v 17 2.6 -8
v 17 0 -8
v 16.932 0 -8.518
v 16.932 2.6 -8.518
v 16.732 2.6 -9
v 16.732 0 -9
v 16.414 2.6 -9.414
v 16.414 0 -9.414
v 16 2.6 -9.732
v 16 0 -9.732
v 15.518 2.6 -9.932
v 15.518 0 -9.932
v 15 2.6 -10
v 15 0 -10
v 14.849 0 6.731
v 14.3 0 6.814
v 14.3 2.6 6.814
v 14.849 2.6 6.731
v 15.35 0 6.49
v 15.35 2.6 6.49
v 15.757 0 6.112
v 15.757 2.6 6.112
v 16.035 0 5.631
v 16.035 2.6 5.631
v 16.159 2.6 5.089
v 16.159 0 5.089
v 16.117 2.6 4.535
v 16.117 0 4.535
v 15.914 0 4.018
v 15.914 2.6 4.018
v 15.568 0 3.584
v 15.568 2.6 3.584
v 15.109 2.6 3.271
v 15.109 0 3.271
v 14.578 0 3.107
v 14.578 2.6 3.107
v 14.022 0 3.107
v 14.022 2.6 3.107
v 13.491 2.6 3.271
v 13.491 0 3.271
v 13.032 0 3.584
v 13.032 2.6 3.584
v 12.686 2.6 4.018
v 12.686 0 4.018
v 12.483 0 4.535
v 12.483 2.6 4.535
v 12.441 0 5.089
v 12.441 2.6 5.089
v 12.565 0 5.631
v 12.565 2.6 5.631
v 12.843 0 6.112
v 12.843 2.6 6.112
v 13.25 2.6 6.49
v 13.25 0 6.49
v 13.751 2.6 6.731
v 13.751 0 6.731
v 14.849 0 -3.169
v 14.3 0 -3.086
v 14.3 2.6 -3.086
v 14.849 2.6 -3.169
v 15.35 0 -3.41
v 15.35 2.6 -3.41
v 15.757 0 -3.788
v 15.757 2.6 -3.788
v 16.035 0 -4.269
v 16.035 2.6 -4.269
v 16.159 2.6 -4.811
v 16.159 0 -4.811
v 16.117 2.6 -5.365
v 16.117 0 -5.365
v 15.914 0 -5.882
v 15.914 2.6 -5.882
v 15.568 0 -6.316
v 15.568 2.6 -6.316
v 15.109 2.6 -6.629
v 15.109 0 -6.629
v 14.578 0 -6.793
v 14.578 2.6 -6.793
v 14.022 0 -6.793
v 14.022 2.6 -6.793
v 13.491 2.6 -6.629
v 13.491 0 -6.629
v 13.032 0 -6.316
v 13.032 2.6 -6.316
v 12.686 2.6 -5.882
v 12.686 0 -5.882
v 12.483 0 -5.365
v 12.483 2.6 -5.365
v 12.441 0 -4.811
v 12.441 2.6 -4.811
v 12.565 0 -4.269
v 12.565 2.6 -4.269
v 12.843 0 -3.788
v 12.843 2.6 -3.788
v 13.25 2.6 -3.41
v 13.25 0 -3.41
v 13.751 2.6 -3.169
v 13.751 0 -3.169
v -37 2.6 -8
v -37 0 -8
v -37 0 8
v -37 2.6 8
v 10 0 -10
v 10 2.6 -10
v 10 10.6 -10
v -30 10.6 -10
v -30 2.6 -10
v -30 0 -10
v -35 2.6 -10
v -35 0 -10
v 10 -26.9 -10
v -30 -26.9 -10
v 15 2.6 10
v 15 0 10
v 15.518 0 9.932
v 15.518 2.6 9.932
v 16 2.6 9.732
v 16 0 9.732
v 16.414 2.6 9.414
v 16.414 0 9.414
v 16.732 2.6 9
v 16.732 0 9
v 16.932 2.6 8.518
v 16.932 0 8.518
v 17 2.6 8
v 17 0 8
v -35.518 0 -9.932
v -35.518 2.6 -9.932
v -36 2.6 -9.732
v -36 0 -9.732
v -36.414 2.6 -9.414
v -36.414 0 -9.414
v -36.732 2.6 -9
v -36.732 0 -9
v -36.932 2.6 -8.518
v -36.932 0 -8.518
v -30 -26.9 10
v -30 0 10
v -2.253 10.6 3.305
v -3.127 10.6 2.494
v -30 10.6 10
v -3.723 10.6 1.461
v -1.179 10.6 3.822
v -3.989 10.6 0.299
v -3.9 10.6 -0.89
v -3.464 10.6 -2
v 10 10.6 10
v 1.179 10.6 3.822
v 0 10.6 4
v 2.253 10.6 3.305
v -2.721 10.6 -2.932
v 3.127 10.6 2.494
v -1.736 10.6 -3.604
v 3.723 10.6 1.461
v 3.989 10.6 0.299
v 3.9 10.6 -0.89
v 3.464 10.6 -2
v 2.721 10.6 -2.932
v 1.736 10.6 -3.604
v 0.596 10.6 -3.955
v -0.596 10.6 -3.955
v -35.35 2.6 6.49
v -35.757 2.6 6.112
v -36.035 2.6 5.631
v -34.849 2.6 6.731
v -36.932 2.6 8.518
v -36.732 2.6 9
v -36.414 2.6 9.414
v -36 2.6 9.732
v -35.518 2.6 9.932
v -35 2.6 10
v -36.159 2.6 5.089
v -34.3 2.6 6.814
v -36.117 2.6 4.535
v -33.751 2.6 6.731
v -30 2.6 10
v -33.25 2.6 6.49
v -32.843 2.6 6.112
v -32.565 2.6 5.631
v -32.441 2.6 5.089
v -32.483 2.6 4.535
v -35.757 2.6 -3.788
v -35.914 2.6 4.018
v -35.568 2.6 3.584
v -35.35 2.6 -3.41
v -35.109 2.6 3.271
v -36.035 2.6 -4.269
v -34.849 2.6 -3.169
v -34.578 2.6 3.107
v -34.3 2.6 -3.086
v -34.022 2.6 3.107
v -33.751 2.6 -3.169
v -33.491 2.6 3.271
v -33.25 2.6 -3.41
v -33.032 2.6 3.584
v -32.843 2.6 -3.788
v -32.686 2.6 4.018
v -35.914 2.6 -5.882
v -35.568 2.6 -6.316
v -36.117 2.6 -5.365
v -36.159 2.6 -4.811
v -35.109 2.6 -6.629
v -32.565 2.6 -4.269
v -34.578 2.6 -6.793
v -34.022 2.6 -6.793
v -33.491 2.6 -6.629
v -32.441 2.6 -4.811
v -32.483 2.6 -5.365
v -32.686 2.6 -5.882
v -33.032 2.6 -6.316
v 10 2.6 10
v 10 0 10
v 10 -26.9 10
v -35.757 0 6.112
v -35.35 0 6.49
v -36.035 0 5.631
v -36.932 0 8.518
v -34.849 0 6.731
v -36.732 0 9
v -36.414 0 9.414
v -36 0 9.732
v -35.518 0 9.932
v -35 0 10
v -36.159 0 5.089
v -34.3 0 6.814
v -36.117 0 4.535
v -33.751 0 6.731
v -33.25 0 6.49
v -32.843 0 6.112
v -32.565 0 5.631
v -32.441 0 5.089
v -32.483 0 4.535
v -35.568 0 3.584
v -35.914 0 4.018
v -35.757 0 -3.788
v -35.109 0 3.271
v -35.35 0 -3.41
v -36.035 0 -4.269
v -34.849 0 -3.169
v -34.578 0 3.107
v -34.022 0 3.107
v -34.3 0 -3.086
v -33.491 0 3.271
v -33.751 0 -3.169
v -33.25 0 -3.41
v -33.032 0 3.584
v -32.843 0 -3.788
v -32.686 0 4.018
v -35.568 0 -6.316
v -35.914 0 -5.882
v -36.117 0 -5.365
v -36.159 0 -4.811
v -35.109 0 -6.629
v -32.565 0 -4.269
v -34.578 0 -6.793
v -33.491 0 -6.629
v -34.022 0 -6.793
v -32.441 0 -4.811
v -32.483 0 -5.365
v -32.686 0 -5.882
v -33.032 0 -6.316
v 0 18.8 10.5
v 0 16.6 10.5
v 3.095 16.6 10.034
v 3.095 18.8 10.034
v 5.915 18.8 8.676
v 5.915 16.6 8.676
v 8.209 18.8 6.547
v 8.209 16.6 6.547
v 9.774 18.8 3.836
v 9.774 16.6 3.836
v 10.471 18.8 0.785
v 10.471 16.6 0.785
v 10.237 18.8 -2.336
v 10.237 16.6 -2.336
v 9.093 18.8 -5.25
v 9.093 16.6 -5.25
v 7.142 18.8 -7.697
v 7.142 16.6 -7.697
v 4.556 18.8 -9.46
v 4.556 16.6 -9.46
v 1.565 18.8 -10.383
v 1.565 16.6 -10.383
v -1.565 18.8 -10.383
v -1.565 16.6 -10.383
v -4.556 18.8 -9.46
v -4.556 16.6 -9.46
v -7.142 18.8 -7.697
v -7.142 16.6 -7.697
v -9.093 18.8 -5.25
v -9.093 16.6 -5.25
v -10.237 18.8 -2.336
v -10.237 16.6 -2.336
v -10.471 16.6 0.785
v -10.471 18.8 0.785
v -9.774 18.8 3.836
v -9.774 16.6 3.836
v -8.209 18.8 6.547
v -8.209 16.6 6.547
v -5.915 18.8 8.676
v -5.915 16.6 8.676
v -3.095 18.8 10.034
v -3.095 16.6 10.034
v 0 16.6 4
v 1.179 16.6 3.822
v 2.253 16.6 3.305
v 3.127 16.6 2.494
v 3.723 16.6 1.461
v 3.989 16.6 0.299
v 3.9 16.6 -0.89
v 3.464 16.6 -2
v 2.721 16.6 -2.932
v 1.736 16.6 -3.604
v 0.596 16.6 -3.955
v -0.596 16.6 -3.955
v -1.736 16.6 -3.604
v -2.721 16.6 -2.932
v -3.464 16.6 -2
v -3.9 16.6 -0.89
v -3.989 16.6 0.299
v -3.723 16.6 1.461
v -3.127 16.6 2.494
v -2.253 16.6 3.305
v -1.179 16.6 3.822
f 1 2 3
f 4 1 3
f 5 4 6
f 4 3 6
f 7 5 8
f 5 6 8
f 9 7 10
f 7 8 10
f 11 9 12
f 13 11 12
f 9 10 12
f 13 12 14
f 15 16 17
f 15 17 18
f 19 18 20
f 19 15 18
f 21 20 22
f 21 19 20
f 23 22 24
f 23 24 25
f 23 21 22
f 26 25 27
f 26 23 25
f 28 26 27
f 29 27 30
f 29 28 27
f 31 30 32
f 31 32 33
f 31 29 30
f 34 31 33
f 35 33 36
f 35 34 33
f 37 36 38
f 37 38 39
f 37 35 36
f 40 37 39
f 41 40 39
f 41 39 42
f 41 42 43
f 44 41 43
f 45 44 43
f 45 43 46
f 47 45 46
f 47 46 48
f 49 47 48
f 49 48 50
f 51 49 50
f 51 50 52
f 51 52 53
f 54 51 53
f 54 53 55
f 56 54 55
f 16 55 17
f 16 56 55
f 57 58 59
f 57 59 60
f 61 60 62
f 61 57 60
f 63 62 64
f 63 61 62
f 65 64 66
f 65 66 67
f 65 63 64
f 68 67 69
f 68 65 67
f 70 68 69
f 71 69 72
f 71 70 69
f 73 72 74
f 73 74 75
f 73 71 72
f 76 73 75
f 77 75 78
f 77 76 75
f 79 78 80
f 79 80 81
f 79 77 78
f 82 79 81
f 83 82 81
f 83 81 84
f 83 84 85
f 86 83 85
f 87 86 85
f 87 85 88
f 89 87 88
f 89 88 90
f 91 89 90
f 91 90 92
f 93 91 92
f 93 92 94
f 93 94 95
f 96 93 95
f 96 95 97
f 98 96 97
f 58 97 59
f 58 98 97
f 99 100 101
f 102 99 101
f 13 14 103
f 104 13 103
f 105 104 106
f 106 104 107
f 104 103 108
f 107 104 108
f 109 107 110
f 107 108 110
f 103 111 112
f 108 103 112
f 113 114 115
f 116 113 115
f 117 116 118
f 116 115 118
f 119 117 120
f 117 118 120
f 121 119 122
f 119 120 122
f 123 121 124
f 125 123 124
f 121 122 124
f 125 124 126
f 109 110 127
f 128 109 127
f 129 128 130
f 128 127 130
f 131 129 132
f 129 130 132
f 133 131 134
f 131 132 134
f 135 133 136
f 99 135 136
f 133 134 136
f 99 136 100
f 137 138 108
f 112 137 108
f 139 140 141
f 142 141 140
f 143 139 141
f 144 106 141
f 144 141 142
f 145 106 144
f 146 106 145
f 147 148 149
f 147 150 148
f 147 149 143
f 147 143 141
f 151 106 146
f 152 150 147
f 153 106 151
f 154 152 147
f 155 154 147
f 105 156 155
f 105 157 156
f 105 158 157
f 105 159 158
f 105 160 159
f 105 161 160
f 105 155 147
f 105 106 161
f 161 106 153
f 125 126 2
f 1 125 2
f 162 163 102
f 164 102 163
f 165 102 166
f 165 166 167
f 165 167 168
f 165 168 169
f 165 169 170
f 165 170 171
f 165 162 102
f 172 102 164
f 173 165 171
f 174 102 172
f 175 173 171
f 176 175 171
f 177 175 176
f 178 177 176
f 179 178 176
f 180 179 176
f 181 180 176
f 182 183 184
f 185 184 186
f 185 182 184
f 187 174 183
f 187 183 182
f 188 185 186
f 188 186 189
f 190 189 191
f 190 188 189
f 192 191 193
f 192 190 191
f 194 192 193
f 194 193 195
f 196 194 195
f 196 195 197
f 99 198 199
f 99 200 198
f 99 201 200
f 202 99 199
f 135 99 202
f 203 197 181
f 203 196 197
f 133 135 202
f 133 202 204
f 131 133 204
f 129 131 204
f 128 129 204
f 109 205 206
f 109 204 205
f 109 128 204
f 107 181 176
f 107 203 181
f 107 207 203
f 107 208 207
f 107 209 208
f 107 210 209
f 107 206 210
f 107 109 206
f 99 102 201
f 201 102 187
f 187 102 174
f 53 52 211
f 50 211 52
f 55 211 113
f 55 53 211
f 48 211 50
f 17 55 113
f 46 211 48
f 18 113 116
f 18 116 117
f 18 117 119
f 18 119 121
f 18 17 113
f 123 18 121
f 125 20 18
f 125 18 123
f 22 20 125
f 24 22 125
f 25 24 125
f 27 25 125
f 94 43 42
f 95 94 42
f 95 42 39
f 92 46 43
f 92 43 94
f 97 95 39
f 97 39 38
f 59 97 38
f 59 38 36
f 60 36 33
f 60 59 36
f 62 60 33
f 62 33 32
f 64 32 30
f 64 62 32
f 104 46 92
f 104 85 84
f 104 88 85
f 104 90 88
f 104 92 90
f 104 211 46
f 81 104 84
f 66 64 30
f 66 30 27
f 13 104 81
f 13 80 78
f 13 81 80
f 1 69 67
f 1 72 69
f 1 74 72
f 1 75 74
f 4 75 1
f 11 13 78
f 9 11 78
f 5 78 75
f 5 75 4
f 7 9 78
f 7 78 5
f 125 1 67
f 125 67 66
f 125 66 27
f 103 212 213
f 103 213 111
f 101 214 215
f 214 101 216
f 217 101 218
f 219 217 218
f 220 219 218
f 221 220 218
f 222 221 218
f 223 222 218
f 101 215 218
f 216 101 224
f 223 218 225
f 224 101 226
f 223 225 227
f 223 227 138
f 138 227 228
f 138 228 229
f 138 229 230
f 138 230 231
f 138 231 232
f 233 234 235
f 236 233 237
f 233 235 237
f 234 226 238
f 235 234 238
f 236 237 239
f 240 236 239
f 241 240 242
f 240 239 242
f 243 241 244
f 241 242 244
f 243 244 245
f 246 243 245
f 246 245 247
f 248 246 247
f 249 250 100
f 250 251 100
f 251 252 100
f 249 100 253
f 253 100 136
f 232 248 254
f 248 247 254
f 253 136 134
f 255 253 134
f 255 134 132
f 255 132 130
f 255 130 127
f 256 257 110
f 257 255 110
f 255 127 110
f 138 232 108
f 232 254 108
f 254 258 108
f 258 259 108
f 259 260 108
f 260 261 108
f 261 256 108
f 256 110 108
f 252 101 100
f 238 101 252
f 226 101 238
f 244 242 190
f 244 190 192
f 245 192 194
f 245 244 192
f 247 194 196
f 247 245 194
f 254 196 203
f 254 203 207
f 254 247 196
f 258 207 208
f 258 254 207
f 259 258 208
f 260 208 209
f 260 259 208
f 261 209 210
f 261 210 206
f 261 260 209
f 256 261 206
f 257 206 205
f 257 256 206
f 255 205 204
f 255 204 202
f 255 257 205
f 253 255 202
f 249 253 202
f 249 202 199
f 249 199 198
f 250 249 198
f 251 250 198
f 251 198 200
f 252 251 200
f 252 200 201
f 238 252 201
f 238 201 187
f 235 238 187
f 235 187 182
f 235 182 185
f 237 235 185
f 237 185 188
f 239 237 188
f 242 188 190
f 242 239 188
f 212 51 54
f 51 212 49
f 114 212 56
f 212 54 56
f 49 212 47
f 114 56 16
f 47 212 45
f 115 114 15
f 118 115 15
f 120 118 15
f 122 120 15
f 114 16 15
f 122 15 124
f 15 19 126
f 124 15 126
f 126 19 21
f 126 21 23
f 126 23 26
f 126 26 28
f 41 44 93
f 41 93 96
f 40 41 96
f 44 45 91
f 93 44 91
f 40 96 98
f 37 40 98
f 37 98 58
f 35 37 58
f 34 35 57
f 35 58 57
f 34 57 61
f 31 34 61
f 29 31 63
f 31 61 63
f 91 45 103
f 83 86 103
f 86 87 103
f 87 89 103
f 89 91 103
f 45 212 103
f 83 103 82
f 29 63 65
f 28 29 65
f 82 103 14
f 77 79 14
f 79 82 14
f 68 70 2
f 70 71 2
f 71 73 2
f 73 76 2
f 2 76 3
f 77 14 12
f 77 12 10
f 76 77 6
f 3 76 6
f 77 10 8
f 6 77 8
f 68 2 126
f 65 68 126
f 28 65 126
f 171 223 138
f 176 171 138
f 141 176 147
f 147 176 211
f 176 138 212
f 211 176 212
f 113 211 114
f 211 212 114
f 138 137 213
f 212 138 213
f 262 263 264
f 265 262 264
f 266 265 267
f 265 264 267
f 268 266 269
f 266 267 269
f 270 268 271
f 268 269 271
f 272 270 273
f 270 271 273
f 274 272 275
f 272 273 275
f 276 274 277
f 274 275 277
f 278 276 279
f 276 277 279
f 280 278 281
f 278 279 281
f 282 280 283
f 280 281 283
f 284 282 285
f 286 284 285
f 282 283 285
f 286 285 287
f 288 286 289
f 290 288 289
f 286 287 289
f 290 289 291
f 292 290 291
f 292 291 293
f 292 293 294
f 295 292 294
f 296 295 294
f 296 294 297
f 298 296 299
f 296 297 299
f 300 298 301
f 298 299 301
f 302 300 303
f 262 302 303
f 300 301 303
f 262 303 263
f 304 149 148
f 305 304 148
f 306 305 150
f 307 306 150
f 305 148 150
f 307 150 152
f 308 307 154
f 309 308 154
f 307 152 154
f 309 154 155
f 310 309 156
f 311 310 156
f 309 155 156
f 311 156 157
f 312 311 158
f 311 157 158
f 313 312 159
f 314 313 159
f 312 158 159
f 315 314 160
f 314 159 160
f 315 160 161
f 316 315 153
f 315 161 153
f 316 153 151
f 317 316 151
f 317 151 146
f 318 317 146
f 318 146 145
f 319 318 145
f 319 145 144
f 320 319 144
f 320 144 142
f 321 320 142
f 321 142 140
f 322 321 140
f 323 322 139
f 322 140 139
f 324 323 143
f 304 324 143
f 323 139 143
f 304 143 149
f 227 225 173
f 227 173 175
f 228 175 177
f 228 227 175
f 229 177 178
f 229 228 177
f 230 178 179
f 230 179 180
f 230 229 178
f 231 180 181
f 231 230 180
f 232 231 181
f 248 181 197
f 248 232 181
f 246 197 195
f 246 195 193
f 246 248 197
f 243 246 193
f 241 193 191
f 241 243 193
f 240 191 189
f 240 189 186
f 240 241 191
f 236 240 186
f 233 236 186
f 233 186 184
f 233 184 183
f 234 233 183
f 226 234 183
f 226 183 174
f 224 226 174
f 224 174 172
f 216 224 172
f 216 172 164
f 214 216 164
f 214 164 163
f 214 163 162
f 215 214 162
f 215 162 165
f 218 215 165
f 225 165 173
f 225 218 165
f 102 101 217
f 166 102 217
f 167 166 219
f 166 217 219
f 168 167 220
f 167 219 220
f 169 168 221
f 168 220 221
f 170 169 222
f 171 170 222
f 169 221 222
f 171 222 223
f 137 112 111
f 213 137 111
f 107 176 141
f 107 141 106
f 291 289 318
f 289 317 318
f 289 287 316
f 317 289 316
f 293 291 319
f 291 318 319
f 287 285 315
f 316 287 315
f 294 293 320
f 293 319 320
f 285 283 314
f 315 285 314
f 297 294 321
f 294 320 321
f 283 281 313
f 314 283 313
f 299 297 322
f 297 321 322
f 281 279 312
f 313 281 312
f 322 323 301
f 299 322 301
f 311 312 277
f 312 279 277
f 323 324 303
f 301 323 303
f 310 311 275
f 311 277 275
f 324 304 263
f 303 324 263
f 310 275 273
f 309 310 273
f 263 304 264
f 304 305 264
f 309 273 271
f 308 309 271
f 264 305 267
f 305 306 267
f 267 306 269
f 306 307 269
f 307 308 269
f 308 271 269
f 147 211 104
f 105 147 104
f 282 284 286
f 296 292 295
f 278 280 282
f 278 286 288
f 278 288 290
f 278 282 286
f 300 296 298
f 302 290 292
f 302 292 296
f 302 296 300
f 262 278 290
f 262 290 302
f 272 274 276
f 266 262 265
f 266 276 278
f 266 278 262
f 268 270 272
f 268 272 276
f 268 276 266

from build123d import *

# Parameters (mm, degrees)
SKETCH_1_W      = 40
SKETCH_1_H      = 20
EXTRUDE_1_DEPTH = 26.9
SKETCH_2_R      = 1.863789346
EXTRUDE_2_DEPTH = 2.6
SKETCH_3_W      = 40
SKETCH_3_H      = 20
EXTRUDE_3_DEPTH = 8
SKETCH_4_R      = 4
EXTRUDE_4_DEPTH = 6
SKETCH_5_R      = 10.5
EXTRUDE_5_DEPTH = 2.2


with BuildPart() as part:
    # 草图1 → 凸台-拉伸1 (new body)
    with BuildSketch(Plane(origin=(0, 0, 0), x_dir=(1, 0, 0), z_dir=(0, 1, 0))):
        with Locations((-10, 0)):
            Rectangle(SKETCH_1_W, SKETCH_1_H)
    extrude(amount=-EXTRUDE_1_DEPTH)

    # 草图2 → 凸台-拉伸2 (add)
    with BuildSketch(Plane(origin=(0, 0, 0), x_dir=(1, 0, 0), z_dir=(0, 1, 0))):
        with BuildLine():
            Line((-35, -10), (15, -10))
            ThreePointArc((15, -10), (16.414213562, -9.414213562), (17, -8))
            Line((17, -8), (17, 8))
            ThreePointArc((17, 8), (16.414213562, 9.414213562), (15, 10))
            Line((15, 10), (-35, 10))
            ThreePointArc((-35, 10), (-36.414213562, 9.414213562), (-37, 8))
            Line((-37, 8), (-37, -8))
            ThreePointArc((-37, -8), (-36.414213562, -9.414213562), (-35, -10))
        make_face()
        with Locations(Location((-34.3, -4.95, 0), (0, 0, 270))):
            Circle(SKETCH_2_R, mode=Mode.SUBTRACT)
        with Locations(Location((-34.3, 4.95, 0), (0, 0, 270))):
            Circle(SKETCH_2_R, mode=Mode.SUBTRACT)
        with Locations(Location((14.3, -4.95, 0), (0, 0, 270))):
            Circle(SKETCH_2_R, mode=Mode.SUBTRACT)
        with Locations(Location((14.3, 4.95, 0), (0, 0, 270))):
            Circle(SKETCH_2_R, mode=Mode.SUBTRACT)
    extrude(amount=EXTRUDE_2_DEPTH)

    # 草图3 → 凸台-拉伸3 (add)
    with BuildSketch(Plane(origin=(0, 2.6, 0), x_dir=(1, 0, 0), z_dir=(0, 1, 0))):
        with Locations((-10, 0)):
            Rectangle(SKETCH_3_W, SKETCH_3_H)
    extrude(amount=EXTRUDE_3_DEPTH)

    # 草图4 → 凸台-拉伸4 (add)
    with BuildSketch(Plane(origin=(0, 10.6, 0), x_dir=(1, 0, 0), z_dir=(0, 1, 0))):
        with Locations(Location((0, 0, 0), (0, 0, 270))):
            Circle(SKETCH_4_R)
    extrude(amount=EXTRUDE_4_DEPTH)

    # 草图5 → 凸台-拉伸5 (add)
    with BuildSketch(Plane(origin=(0, 16.6, 0), x_dir=(1, 0, 0), z_dir=(0, 1, 0))):
        with Locations(Location((0, 0, 0), (0, 0, 270))):
            Circle(SKETCH_5_R)
    extrude(amount=EXTRUDE_5_DEPTH)


solid = part.part
